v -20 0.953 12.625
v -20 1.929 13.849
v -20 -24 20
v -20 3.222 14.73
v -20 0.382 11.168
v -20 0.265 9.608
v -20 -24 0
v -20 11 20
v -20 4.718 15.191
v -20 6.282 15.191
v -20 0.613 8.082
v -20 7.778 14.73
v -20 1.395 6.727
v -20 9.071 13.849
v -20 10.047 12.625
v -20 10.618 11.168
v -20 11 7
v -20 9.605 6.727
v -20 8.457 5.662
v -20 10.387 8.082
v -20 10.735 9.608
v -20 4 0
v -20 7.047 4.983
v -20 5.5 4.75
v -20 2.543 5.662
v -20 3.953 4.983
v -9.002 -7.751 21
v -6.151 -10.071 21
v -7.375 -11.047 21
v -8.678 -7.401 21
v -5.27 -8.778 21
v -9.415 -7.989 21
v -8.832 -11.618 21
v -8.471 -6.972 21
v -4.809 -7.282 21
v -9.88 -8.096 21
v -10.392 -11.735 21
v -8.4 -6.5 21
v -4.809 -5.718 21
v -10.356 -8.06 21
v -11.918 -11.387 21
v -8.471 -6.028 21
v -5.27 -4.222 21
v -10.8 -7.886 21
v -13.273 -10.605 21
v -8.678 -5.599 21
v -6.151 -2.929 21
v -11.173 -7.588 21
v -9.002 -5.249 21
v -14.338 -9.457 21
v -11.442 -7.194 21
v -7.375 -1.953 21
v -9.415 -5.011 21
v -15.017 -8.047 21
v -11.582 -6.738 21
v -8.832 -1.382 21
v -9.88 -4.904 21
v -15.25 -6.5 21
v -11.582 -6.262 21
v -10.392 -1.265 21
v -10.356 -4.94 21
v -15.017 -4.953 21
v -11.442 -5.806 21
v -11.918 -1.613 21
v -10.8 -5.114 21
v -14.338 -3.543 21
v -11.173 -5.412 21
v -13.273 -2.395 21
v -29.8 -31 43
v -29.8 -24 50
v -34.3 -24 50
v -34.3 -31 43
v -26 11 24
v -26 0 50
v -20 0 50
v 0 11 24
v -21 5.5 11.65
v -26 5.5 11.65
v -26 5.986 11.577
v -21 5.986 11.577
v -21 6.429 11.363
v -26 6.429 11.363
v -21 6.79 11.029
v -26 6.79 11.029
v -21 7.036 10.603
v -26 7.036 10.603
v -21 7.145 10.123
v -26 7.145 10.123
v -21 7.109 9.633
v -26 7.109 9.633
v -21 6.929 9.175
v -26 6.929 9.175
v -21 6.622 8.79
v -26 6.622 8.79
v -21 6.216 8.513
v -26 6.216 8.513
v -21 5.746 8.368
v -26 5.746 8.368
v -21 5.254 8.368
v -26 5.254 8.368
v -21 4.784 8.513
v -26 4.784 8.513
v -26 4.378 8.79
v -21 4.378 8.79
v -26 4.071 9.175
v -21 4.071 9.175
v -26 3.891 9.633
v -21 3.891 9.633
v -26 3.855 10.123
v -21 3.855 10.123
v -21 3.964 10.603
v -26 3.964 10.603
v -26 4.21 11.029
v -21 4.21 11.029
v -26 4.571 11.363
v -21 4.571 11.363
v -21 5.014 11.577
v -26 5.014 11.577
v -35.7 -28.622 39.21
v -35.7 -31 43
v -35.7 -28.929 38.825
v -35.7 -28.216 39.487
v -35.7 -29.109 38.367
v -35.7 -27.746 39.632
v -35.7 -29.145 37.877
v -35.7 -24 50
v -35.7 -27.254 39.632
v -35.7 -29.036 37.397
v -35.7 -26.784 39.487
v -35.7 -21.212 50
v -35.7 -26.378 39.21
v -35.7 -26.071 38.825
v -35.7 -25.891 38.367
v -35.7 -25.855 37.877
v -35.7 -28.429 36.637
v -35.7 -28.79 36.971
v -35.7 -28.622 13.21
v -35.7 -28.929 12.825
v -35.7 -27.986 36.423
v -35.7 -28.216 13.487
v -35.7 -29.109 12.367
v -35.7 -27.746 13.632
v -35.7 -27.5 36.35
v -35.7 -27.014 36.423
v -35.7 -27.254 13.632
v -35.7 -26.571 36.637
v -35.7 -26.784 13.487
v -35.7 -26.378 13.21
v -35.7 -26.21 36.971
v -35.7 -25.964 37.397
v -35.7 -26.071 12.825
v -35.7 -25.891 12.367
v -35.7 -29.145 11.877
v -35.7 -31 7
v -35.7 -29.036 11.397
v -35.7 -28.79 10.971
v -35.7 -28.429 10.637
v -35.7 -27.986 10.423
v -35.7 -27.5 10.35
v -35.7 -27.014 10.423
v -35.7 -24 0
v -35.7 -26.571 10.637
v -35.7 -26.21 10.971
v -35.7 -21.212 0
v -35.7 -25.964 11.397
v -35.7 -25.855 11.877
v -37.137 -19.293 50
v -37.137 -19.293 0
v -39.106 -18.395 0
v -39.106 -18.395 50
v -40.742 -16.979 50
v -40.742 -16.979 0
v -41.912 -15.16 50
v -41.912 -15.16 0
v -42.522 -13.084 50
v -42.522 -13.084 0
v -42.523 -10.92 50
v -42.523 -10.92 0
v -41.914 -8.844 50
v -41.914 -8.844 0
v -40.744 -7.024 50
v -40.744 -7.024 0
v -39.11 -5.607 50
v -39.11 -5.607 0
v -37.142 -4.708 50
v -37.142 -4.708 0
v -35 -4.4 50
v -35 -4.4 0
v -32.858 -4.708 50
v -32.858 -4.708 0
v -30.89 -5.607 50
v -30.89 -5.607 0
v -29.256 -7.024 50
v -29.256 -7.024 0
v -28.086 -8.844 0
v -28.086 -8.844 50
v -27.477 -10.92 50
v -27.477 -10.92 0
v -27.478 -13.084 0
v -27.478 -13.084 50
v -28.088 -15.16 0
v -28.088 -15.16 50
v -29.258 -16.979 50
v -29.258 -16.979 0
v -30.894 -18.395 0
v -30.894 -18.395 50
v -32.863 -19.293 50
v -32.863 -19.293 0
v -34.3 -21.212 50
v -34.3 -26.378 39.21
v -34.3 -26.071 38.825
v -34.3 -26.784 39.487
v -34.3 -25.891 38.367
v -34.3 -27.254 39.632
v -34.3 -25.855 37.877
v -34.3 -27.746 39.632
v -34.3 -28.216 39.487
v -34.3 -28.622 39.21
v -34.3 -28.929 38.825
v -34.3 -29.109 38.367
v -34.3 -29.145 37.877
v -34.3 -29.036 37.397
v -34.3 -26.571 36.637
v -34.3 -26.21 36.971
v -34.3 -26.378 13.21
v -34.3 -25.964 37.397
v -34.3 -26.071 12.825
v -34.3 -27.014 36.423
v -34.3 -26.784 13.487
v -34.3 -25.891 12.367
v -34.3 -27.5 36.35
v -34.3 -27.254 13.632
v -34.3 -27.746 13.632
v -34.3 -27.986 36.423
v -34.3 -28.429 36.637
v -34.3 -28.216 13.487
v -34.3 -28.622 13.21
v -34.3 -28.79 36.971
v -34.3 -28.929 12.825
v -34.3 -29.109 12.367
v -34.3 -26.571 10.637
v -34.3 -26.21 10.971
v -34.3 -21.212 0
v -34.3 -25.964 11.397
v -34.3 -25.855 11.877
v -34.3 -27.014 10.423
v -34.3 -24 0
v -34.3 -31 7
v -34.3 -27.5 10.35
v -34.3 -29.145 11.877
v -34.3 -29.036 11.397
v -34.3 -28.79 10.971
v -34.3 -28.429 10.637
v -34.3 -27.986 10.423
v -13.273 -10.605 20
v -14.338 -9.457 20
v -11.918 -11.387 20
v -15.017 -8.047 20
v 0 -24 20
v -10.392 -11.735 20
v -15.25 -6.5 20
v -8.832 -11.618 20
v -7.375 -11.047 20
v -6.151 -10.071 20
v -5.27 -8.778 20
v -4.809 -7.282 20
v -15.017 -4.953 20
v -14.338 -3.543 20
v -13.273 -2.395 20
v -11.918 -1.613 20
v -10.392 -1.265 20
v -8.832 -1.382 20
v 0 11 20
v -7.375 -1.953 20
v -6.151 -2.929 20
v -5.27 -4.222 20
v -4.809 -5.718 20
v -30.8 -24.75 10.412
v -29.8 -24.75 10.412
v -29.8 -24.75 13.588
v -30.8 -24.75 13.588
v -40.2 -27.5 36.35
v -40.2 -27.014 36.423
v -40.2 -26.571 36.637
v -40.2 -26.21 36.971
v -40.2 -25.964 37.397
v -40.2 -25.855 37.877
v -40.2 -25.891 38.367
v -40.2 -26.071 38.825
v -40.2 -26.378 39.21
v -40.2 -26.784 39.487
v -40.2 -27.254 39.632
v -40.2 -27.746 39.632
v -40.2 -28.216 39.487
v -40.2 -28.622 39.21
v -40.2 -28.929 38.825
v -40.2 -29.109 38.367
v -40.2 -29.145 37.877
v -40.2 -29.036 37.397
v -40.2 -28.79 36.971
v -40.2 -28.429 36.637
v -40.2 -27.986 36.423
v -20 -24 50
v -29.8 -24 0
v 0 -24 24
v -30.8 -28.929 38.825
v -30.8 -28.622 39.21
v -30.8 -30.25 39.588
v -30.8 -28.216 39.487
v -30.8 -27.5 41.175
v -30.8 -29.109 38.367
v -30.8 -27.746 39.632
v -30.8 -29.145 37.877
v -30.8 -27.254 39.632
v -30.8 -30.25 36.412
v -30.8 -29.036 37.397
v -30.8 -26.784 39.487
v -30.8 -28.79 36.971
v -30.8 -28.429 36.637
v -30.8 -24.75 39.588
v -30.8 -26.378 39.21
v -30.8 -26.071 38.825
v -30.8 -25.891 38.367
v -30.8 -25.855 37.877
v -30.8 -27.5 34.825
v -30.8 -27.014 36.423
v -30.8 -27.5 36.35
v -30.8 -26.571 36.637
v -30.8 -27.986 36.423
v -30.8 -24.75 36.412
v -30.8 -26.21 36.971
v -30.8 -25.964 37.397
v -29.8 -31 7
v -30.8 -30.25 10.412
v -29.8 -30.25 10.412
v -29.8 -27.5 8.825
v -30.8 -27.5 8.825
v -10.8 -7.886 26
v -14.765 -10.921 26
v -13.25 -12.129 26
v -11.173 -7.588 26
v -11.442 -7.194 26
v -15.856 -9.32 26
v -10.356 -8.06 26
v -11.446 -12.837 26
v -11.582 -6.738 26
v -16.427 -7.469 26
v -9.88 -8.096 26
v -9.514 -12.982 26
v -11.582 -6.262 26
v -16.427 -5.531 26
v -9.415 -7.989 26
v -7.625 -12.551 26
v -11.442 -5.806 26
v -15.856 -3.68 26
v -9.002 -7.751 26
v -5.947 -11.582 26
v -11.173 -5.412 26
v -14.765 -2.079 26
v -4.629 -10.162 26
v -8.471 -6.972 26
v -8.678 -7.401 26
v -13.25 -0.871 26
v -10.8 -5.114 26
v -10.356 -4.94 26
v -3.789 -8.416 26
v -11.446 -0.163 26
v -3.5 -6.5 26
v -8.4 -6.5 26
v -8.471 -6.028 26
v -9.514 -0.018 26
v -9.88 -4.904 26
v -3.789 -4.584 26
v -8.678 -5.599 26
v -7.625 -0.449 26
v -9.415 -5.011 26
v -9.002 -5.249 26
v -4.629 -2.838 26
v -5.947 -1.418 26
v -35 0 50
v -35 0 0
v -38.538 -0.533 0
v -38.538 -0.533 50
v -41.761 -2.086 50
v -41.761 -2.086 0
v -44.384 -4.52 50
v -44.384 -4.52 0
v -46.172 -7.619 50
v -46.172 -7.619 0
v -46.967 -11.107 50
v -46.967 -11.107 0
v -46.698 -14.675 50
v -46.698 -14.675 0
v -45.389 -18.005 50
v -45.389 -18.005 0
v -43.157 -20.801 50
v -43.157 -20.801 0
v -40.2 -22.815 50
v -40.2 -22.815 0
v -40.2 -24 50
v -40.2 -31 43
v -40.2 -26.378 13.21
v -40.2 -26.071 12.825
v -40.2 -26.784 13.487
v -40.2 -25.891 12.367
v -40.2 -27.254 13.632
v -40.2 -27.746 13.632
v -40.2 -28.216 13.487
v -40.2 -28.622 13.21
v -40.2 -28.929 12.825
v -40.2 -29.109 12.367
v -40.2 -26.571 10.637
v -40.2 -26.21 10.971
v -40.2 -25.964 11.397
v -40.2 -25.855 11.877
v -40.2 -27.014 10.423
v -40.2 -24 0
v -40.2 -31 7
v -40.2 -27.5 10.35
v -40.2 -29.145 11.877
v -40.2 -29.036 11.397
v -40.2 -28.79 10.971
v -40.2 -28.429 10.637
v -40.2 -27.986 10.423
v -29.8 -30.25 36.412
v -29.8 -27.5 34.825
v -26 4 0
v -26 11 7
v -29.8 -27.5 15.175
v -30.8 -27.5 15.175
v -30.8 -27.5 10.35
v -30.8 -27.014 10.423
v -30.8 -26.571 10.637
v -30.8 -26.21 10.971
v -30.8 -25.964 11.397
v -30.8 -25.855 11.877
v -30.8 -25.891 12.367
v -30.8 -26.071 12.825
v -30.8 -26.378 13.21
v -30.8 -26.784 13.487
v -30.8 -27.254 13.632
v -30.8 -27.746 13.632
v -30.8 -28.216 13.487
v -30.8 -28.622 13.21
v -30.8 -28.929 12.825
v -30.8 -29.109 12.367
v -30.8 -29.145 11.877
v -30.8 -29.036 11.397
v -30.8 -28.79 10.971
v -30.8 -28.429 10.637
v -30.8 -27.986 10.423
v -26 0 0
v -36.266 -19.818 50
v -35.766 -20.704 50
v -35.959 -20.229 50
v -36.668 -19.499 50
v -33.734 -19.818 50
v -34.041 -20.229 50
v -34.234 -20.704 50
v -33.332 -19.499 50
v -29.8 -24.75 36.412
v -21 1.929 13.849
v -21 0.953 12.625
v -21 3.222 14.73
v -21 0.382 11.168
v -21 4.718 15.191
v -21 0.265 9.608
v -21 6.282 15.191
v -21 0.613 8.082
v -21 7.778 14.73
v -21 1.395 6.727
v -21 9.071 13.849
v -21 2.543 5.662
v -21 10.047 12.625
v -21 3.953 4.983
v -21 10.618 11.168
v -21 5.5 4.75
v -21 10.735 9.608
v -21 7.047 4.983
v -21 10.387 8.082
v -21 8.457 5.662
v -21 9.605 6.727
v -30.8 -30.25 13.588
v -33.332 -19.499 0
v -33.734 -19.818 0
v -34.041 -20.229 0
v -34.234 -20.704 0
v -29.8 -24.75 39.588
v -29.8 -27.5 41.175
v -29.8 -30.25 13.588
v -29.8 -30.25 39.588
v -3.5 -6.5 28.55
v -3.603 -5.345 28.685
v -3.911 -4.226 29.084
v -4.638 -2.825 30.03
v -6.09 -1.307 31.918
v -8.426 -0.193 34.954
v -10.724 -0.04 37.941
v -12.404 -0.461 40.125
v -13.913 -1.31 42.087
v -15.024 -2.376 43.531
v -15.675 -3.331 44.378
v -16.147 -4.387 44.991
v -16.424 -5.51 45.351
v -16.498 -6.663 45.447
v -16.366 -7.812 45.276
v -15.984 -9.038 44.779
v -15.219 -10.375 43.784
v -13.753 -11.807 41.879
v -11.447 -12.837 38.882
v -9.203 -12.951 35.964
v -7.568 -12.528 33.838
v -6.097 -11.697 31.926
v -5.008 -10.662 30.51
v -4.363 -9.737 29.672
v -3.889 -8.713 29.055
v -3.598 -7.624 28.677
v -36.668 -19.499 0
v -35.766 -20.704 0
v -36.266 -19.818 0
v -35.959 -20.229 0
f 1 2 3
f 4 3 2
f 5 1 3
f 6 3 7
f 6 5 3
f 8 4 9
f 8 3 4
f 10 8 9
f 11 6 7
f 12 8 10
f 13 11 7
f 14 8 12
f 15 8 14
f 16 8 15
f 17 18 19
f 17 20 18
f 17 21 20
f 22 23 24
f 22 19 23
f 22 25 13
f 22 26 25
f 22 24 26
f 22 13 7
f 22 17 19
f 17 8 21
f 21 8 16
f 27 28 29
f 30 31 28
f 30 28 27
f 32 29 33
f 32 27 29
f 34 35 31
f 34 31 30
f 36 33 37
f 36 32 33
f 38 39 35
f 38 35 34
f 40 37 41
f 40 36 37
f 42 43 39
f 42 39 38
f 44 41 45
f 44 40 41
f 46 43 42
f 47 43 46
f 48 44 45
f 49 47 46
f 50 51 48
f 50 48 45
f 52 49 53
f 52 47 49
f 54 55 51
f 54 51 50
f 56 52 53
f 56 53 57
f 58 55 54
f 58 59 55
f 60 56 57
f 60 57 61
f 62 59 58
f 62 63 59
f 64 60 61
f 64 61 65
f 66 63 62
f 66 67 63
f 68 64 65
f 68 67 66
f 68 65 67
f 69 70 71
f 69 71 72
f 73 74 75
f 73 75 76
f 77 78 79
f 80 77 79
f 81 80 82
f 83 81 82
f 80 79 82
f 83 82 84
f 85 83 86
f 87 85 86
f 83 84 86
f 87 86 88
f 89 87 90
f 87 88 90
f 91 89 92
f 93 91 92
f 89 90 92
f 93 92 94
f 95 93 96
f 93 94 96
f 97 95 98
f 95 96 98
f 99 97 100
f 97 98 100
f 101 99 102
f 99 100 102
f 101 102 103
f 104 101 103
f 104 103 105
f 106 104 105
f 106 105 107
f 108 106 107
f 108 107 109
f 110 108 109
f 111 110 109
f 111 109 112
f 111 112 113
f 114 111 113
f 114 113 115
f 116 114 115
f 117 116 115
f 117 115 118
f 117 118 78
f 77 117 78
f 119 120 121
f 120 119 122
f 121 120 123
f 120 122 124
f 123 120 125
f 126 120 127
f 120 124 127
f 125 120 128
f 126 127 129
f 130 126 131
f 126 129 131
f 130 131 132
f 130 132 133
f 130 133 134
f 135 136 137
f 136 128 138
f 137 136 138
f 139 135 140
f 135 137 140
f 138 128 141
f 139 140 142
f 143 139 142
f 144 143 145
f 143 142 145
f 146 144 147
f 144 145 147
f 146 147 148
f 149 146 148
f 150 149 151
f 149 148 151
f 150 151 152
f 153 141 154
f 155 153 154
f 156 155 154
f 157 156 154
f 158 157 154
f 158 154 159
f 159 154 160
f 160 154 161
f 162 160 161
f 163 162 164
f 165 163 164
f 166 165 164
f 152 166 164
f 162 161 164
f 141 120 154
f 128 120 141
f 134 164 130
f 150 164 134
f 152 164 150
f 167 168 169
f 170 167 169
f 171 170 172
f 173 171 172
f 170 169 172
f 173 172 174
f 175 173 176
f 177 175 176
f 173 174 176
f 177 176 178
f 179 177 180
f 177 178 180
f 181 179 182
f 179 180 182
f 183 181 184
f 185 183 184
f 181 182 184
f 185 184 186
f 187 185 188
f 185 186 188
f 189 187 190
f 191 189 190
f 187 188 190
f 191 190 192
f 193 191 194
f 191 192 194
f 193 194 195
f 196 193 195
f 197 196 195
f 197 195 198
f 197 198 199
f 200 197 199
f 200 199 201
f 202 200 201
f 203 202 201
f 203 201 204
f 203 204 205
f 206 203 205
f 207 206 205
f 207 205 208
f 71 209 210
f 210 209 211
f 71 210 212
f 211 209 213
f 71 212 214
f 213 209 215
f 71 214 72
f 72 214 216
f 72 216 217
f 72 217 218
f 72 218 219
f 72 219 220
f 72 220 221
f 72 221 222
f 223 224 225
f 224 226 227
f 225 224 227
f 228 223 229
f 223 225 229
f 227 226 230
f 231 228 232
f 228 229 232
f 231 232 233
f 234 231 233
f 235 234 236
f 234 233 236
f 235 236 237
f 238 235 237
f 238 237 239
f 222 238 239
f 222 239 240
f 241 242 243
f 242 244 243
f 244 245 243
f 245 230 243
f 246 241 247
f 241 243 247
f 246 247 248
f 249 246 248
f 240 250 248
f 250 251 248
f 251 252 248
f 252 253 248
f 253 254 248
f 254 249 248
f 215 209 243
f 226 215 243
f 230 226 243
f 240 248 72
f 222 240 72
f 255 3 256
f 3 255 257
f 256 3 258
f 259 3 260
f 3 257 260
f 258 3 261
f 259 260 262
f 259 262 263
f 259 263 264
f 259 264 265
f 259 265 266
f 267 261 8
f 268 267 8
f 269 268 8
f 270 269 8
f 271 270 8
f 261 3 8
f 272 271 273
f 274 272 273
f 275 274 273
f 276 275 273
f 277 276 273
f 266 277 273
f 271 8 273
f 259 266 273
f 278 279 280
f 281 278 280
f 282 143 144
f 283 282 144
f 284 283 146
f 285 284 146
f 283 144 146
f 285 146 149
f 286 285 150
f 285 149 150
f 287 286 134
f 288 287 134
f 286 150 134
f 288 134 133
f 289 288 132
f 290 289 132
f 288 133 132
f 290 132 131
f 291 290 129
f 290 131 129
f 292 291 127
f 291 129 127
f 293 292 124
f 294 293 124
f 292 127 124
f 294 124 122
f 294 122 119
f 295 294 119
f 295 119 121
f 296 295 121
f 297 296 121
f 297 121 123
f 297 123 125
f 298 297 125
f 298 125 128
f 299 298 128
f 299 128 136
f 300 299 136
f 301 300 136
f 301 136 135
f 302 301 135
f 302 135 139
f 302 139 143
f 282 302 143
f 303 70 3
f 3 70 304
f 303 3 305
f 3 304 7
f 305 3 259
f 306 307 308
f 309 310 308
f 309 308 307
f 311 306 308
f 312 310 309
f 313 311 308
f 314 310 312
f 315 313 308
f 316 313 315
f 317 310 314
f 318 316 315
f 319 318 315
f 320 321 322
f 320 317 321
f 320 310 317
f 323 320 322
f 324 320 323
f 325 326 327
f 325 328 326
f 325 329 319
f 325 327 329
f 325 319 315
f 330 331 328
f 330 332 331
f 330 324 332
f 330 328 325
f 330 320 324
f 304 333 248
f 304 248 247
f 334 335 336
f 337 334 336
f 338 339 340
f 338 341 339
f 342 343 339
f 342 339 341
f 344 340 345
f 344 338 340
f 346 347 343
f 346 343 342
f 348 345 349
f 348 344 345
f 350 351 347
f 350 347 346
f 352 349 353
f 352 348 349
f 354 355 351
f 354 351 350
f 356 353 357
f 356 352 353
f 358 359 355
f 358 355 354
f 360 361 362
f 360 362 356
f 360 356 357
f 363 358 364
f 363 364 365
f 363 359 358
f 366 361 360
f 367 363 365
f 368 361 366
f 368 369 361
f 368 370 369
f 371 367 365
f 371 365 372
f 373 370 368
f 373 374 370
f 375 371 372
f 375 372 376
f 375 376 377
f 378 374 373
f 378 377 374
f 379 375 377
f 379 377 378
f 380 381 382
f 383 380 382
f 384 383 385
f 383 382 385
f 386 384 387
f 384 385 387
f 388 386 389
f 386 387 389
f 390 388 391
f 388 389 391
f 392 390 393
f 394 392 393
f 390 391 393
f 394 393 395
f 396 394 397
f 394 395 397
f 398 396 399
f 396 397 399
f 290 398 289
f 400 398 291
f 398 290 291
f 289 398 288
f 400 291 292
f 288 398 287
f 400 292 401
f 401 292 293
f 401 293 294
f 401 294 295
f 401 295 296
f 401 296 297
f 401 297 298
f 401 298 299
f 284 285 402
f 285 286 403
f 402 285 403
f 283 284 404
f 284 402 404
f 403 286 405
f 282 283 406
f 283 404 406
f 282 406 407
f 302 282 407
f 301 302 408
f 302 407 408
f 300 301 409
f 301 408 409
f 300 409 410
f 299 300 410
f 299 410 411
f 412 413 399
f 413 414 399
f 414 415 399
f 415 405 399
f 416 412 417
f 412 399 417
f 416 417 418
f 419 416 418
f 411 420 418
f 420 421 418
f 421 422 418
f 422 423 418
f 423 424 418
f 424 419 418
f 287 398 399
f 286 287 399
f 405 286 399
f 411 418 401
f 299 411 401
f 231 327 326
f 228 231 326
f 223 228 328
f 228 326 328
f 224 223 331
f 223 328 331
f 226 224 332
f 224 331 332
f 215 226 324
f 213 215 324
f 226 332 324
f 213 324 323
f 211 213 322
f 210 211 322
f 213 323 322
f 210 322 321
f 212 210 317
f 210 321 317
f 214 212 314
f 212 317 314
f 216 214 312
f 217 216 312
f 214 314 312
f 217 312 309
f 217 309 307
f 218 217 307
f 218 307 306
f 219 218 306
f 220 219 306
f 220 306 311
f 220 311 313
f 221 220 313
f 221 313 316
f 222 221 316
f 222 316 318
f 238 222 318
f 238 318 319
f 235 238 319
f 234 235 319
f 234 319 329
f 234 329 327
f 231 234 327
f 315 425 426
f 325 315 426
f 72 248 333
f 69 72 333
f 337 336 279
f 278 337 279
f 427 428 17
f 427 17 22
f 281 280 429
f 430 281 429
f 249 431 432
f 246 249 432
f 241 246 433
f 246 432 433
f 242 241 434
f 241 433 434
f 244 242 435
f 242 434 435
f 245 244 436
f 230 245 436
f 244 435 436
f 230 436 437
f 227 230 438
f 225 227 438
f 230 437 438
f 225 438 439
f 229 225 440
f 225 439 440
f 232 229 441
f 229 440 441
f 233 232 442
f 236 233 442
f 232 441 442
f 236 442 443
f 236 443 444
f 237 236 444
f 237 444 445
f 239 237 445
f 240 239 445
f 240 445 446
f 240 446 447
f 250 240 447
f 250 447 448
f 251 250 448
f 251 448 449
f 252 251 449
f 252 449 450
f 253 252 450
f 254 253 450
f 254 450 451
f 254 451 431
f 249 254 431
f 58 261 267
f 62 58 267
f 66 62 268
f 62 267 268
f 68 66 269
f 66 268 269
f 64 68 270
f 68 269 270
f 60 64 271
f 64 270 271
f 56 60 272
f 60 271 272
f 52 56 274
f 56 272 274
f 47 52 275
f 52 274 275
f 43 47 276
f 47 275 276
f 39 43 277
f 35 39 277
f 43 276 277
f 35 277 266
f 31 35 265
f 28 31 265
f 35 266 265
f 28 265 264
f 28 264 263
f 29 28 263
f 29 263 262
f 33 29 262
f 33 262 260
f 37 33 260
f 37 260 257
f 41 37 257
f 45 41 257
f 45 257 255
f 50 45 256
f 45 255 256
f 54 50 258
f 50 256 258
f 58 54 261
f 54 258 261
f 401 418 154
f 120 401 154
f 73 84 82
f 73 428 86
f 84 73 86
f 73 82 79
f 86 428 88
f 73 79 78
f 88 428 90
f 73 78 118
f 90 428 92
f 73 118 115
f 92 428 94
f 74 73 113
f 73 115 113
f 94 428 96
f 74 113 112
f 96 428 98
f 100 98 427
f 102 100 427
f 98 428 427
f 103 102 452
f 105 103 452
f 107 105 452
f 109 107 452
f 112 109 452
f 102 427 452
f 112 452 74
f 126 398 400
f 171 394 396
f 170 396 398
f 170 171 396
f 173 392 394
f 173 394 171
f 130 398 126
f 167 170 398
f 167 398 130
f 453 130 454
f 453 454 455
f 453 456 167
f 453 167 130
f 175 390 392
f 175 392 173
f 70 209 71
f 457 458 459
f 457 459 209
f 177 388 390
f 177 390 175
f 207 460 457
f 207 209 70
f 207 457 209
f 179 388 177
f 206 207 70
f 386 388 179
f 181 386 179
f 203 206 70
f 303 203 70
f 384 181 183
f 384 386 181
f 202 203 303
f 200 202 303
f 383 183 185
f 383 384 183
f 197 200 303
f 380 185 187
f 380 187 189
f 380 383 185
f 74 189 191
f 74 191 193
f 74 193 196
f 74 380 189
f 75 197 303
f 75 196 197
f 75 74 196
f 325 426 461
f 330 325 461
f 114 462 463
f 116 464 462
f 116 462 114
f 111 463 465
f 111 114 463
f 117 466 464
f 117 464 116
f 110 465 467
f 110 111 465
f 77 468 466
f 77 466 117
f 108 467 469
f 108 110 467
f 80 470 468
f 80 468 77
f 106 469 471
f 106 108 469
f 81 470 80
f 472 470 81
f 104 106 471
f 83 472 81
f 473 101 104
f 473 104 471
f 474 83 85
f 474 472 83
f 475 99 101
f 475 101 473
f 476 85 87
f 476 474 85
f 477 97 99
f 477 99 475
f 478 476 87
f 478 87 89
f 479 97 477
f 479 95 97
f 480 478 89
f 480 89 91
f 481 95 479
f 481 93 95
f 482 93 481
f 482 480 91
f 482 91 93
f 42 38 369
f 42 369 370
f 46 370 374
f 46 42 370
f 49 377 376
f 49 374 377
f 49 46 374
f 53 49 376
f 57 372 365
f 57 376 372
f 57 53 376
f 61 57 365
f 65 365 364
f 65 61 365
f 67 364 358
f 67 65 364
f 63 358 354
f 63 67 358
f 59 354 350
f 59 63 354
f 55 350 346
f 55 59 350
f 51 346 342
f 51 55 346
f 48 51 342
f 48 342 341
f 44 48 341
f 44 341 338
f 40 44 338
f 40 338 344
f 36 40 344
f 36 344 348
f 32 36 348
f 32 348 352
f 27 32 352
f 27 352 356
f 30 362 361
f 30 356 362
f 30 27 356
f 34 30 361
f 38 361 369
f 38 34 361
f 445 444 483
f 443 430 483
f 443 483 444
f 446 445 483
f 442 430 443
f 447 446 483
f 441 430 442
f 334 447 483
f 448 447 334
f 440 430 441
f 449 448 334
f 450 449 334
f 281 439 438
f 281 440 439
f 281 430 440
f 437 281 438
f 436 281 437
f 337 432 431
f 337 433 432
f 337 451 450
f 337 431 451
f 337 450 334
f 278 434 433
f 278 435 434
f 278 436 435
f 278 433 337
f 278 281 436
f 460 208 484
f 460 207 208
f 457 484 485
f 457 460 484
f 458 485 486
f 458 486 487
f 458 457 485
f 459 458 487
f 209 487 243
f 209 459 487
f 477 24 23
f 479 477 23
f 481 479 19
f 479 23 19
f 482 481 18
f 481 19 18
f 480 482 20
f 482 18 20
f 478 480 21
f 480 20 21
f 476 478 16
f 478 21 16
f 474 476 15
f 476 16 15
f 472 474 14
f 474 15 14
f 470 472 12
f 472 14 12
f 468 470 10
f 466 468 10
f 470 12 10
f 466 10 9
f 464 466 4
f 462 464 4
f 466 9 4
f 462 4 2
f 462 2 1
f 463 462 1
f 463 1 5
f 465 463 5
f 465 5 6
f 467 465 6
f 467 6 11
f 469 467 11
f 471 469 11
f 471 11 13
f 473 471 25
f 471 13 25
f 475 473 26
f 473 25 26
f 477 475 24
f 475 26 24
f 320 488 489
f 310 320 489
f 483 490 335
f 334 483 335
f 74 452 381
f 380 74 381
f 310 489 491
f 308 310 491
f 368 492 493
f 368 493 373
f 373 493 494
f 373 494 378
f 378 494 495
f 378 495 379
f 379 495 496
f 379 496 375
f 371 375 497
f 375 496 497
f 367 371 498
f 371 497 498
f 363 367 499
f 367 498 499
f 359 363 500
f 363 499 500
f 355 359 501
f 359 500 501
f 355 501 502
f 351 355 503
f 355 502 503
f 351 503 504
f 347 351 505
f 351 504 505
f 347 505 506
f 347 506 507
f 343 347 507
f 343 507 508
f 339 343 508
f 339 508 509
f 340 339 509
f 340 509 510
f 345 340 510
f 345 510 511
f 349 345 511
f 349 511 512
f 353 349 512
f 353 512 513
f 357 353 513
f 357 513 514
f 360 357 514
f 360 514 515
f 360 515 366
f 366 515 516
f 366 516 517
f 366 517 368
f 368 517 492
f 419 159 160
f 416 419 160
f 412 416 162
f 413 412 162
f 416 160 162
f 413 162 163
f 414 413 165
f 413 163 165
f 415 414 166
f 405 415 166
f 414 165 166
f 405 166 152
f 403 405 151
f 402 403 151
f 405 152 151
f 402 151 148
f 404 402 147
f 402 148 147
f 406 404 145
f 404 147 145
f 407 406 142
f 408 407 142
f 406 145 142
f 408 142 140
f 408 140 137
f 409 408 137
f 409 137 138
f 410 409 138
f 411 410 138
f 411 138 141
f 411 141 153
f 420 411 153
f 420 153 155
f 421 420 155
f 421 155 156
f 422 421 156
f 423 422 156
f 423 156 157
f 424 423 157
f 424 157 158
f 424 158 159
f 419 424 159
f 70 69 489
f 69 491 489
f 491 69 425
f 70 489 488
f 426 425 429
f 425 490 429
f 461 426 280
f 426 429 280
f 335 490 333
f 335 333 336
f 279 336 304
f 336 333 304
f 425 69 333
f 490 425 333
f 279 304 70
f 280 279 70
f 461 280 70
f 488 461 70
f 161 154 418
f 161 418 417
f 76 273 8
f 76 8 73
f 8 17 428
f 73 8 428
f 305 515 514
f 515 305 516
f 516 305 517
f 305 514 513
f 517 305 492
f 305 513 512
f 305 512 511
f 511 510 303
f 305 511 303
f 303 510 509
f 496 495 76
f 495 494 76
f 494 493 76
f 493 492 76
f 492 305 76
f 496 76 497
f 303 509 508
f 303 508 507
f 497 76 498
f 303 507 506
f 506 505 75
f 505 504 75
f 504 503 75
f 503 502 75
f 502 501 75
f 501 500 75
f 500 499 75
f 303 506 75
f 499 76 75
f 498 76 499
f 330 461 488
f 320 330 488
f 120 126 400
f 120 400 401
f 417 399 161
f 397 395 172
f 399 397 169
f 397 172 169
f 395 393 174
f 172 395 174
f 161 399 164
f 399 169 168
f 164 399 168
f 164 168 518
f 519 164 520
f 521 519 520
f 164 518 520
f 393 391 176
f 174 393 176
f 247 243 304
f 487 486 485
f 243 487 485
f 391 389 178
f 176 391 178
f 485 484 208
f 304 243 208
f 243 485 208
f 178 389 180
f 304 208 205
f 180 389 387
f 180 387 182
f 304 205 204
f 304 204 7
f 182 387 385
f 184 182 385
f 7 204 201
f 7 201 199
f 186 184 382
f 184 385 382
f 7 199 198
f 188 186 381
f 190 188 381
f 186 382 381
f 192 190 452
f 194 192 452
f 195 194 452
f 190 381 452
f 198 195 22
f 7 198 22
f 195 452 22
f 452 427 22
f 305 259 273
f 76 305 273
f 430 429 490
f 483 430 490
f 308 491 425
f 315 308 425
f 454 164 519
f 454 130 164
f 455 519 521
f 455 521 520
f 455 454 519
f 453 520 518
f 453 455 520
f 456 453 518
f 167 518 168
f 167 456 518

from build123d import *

# Parameters (mm, degrees)
ESBO_O1_R                  = 1.6
RESSALTO_EXTRUS_O1_DEPTH   = 50
ESBO_O2_W                  = 20
ESBO_O2_H                  = 20
CORTE_EXTRUS_O1_DEPTH      = 43
ESBO_O3_R                  = 1.65
CORTE_EXTRUS_O2_DEPTH      = 22
CORTE_EXTRUS_O2_DEPTH_BACK = 27
ESBO_O6_R                  = 1.65
CORTE_EXTRUS_O4_DEPTH      = 18.2
FILETE1_R                  = 2
ESBO_O4_R                  = 6.5
CORTE_EXTRUS_O5_DEPTH      = 24
CORTE_EXTRUS_O6_DEPTH      = 1
ESBO_O8_R                  = 5.25
CORTE_EXTRUS_O7_DEPTH      = 1
ESBO_O9_R                  = 5.25
CORTE_EXTRUS_O8_DEPTH      = 1


with BuildPart() as part:
    # Esboço1 → Ressalto-extrusão1 (new body)
    with BuildSketch(Plane.XY):
        with BuildLine():
            Line((0, 0), (0, 11))
            Line((0, 11), (-26, 11))
            Line((-26, 11), (-26, 0))
            Line((-26, 0), (-35, 0))
            ThreePointArc((-35, 0), (-46.699949915, -9.333321918), (-40.2, -22.814804668))
            Line((-40.2, -22.814804668), (-40.2, -31))
            Line((-40.2, -31), (-35.7, -31))
            Line((-35.7, -31), (-35.7, -19.567694497))
            ThreePointArc((-35.7, -19.567694497), (-35, -4.4), (-34.3, -19.567694497))
            Line((-34.3, -19.567694497), (-34.3, -31))
            Line((-34.3, -31), (-29.8, -31))
            Line((-29.8, -31), (-29.8, -24))
            Line((-29.8, -24), (0, -24))
            Line((0, -24), (0, 0))
        make_face()
        with Locations((-10, -6.5)):
            Circle(ESBO_O1_R, mode=Mode.SUBTRACT)
    extrude(amount=RESSALTO_EXTRUS_O1_DEPTH)

    # Esboço2 → Corte-extrusão1 (cut, through all)
    with BuildSketch(Plane(origin=(0, 11, 0), x_dir=(1, 0, 0), z_dir=(0, 1, 0))):
        Polygon((0, -24), (-20, -50), (0, -50), align=None)
        with Locations((-10, -10)):
            Rectangle(ESBO_O2_W, ESBO_O2_H)
    extrude(amount=-CORTE_EXTRUS_O1_DEPTH, mode=Mode.SUBTRACT)

    # Esboço3 → Corte-extrusão2 (cut, two sides)
    with BuildSketch(Plane.ZY.offset(26)) as corte_extrus_o2_sk:
        with Locations((10, 5.5)):
            Circle(ESBO_O3_R)
        Polygon((50, -24), (43, -31), (50, -31), align=None)
        Polygon((50, 0), (24, 11), (50, 11), align=None)
        Polygon((0, -24), (0, -31), (7, -31), align=None)
        Polygon((7, 11), (0, 4), (0, 11), align=None)
    extrude(amount=CORTE_EXTRUS_O2_DEPTH, mode=Mode.SUBTRACT)
    extrude(corte_extrus_o2_sk.sketch, amount=-CORTE_EXTRUS_O2_DEPTH_BACK, mode=Mode.SUBTRACT)

    # Esboço6 → Corte-extrusão4 (cut, through all)
    with BuildSketch(Plane(origin=(-29.8, 0, 0), x_dir=(0, 0, -1), z_dir=(1, 0, 0))):
        with Locations((-38, -27.5)):
            Circle(ESBO_O6_R)
        with Locations((-12, -27.5)):
            Circle(ESBO_O6_R)
    extrude(amount=-CORTE_EXTRUS_O4_DEPTH, mode=Mode.SUBTRACT)

    # Filete1
    filete1_edges = [part.edges().sort_by_distance(p)[0] for p in [
        (-34.3, -19.567694497, 25),
        (-35.7, -19.567694497, 25),
    ]]
    fillet(filete1_edges, radius=FILETE1_R)

    # Esboço4 → Corte-extrusão5 (cut)
    with BuildSketch(Plane.XY.offset(50)):
        with Locations((-10, -6.5)):
            Circle(ESBO_O4_R)
    extrude(amount=-CORTE_EXTRUS_O5_DEPTH, mode=Mode.SUBTRACT)

    # Esboço7 → Corte-extrusão6 (cut)
    with BuildSketch(Plane(origin=(-29.8, 0, 0), x_dir=(0, 0, -1), z_dir=(1, 0, 0))):
        Polygon((-8.824573519, -27.5), (-10.41228676, -24.75), (-13.58771324, -24.75), (-15.175426481, -27.5), (-13.58771324, -30.25), (-10.41228676, -30.25), align=None)
        Polygon((-34.824573519, -27.5), (-36.41228676, -24.75), (-39.58771324, -24.75), (-41.175426481, -27.5), (-39.58771324, -30.25), (-36.41228676, -30.25), align=None)
    extrude(amount=-CORTE_EXTRUS_O6_DEPTH, mode=Mode.SUBTRACT)

    # Esboço8 → Corte-extrusão7 (cut)
    with BuildSketch(Plane(origin=(-20, 0, 0), x_dir=(0, 0, -1), z_dir=(1, 0, 0))):
        with Locations((-10, 5.5)):
            Circle(ESBO_O8_R)
    extrude(amount=-CORTE_EXTRUS_O7_DEPTH, mode=Mode.SUBTRACT)

    # Esboço9 → Corte-extrusão8 (cut)
    with BuildSketch(Plane(origin=(0, 0, 20), x_dir=(-1, 0, 0), z_dir=(0, 0, -1))):
        with Locations((10, -6.5)):
            Circle(ESBO_O9_R)
    extrude(amount=-CORTE_EXTRUS_O8_DEPTH, mode=Mode.SUBTRACT)


solid = part.part
